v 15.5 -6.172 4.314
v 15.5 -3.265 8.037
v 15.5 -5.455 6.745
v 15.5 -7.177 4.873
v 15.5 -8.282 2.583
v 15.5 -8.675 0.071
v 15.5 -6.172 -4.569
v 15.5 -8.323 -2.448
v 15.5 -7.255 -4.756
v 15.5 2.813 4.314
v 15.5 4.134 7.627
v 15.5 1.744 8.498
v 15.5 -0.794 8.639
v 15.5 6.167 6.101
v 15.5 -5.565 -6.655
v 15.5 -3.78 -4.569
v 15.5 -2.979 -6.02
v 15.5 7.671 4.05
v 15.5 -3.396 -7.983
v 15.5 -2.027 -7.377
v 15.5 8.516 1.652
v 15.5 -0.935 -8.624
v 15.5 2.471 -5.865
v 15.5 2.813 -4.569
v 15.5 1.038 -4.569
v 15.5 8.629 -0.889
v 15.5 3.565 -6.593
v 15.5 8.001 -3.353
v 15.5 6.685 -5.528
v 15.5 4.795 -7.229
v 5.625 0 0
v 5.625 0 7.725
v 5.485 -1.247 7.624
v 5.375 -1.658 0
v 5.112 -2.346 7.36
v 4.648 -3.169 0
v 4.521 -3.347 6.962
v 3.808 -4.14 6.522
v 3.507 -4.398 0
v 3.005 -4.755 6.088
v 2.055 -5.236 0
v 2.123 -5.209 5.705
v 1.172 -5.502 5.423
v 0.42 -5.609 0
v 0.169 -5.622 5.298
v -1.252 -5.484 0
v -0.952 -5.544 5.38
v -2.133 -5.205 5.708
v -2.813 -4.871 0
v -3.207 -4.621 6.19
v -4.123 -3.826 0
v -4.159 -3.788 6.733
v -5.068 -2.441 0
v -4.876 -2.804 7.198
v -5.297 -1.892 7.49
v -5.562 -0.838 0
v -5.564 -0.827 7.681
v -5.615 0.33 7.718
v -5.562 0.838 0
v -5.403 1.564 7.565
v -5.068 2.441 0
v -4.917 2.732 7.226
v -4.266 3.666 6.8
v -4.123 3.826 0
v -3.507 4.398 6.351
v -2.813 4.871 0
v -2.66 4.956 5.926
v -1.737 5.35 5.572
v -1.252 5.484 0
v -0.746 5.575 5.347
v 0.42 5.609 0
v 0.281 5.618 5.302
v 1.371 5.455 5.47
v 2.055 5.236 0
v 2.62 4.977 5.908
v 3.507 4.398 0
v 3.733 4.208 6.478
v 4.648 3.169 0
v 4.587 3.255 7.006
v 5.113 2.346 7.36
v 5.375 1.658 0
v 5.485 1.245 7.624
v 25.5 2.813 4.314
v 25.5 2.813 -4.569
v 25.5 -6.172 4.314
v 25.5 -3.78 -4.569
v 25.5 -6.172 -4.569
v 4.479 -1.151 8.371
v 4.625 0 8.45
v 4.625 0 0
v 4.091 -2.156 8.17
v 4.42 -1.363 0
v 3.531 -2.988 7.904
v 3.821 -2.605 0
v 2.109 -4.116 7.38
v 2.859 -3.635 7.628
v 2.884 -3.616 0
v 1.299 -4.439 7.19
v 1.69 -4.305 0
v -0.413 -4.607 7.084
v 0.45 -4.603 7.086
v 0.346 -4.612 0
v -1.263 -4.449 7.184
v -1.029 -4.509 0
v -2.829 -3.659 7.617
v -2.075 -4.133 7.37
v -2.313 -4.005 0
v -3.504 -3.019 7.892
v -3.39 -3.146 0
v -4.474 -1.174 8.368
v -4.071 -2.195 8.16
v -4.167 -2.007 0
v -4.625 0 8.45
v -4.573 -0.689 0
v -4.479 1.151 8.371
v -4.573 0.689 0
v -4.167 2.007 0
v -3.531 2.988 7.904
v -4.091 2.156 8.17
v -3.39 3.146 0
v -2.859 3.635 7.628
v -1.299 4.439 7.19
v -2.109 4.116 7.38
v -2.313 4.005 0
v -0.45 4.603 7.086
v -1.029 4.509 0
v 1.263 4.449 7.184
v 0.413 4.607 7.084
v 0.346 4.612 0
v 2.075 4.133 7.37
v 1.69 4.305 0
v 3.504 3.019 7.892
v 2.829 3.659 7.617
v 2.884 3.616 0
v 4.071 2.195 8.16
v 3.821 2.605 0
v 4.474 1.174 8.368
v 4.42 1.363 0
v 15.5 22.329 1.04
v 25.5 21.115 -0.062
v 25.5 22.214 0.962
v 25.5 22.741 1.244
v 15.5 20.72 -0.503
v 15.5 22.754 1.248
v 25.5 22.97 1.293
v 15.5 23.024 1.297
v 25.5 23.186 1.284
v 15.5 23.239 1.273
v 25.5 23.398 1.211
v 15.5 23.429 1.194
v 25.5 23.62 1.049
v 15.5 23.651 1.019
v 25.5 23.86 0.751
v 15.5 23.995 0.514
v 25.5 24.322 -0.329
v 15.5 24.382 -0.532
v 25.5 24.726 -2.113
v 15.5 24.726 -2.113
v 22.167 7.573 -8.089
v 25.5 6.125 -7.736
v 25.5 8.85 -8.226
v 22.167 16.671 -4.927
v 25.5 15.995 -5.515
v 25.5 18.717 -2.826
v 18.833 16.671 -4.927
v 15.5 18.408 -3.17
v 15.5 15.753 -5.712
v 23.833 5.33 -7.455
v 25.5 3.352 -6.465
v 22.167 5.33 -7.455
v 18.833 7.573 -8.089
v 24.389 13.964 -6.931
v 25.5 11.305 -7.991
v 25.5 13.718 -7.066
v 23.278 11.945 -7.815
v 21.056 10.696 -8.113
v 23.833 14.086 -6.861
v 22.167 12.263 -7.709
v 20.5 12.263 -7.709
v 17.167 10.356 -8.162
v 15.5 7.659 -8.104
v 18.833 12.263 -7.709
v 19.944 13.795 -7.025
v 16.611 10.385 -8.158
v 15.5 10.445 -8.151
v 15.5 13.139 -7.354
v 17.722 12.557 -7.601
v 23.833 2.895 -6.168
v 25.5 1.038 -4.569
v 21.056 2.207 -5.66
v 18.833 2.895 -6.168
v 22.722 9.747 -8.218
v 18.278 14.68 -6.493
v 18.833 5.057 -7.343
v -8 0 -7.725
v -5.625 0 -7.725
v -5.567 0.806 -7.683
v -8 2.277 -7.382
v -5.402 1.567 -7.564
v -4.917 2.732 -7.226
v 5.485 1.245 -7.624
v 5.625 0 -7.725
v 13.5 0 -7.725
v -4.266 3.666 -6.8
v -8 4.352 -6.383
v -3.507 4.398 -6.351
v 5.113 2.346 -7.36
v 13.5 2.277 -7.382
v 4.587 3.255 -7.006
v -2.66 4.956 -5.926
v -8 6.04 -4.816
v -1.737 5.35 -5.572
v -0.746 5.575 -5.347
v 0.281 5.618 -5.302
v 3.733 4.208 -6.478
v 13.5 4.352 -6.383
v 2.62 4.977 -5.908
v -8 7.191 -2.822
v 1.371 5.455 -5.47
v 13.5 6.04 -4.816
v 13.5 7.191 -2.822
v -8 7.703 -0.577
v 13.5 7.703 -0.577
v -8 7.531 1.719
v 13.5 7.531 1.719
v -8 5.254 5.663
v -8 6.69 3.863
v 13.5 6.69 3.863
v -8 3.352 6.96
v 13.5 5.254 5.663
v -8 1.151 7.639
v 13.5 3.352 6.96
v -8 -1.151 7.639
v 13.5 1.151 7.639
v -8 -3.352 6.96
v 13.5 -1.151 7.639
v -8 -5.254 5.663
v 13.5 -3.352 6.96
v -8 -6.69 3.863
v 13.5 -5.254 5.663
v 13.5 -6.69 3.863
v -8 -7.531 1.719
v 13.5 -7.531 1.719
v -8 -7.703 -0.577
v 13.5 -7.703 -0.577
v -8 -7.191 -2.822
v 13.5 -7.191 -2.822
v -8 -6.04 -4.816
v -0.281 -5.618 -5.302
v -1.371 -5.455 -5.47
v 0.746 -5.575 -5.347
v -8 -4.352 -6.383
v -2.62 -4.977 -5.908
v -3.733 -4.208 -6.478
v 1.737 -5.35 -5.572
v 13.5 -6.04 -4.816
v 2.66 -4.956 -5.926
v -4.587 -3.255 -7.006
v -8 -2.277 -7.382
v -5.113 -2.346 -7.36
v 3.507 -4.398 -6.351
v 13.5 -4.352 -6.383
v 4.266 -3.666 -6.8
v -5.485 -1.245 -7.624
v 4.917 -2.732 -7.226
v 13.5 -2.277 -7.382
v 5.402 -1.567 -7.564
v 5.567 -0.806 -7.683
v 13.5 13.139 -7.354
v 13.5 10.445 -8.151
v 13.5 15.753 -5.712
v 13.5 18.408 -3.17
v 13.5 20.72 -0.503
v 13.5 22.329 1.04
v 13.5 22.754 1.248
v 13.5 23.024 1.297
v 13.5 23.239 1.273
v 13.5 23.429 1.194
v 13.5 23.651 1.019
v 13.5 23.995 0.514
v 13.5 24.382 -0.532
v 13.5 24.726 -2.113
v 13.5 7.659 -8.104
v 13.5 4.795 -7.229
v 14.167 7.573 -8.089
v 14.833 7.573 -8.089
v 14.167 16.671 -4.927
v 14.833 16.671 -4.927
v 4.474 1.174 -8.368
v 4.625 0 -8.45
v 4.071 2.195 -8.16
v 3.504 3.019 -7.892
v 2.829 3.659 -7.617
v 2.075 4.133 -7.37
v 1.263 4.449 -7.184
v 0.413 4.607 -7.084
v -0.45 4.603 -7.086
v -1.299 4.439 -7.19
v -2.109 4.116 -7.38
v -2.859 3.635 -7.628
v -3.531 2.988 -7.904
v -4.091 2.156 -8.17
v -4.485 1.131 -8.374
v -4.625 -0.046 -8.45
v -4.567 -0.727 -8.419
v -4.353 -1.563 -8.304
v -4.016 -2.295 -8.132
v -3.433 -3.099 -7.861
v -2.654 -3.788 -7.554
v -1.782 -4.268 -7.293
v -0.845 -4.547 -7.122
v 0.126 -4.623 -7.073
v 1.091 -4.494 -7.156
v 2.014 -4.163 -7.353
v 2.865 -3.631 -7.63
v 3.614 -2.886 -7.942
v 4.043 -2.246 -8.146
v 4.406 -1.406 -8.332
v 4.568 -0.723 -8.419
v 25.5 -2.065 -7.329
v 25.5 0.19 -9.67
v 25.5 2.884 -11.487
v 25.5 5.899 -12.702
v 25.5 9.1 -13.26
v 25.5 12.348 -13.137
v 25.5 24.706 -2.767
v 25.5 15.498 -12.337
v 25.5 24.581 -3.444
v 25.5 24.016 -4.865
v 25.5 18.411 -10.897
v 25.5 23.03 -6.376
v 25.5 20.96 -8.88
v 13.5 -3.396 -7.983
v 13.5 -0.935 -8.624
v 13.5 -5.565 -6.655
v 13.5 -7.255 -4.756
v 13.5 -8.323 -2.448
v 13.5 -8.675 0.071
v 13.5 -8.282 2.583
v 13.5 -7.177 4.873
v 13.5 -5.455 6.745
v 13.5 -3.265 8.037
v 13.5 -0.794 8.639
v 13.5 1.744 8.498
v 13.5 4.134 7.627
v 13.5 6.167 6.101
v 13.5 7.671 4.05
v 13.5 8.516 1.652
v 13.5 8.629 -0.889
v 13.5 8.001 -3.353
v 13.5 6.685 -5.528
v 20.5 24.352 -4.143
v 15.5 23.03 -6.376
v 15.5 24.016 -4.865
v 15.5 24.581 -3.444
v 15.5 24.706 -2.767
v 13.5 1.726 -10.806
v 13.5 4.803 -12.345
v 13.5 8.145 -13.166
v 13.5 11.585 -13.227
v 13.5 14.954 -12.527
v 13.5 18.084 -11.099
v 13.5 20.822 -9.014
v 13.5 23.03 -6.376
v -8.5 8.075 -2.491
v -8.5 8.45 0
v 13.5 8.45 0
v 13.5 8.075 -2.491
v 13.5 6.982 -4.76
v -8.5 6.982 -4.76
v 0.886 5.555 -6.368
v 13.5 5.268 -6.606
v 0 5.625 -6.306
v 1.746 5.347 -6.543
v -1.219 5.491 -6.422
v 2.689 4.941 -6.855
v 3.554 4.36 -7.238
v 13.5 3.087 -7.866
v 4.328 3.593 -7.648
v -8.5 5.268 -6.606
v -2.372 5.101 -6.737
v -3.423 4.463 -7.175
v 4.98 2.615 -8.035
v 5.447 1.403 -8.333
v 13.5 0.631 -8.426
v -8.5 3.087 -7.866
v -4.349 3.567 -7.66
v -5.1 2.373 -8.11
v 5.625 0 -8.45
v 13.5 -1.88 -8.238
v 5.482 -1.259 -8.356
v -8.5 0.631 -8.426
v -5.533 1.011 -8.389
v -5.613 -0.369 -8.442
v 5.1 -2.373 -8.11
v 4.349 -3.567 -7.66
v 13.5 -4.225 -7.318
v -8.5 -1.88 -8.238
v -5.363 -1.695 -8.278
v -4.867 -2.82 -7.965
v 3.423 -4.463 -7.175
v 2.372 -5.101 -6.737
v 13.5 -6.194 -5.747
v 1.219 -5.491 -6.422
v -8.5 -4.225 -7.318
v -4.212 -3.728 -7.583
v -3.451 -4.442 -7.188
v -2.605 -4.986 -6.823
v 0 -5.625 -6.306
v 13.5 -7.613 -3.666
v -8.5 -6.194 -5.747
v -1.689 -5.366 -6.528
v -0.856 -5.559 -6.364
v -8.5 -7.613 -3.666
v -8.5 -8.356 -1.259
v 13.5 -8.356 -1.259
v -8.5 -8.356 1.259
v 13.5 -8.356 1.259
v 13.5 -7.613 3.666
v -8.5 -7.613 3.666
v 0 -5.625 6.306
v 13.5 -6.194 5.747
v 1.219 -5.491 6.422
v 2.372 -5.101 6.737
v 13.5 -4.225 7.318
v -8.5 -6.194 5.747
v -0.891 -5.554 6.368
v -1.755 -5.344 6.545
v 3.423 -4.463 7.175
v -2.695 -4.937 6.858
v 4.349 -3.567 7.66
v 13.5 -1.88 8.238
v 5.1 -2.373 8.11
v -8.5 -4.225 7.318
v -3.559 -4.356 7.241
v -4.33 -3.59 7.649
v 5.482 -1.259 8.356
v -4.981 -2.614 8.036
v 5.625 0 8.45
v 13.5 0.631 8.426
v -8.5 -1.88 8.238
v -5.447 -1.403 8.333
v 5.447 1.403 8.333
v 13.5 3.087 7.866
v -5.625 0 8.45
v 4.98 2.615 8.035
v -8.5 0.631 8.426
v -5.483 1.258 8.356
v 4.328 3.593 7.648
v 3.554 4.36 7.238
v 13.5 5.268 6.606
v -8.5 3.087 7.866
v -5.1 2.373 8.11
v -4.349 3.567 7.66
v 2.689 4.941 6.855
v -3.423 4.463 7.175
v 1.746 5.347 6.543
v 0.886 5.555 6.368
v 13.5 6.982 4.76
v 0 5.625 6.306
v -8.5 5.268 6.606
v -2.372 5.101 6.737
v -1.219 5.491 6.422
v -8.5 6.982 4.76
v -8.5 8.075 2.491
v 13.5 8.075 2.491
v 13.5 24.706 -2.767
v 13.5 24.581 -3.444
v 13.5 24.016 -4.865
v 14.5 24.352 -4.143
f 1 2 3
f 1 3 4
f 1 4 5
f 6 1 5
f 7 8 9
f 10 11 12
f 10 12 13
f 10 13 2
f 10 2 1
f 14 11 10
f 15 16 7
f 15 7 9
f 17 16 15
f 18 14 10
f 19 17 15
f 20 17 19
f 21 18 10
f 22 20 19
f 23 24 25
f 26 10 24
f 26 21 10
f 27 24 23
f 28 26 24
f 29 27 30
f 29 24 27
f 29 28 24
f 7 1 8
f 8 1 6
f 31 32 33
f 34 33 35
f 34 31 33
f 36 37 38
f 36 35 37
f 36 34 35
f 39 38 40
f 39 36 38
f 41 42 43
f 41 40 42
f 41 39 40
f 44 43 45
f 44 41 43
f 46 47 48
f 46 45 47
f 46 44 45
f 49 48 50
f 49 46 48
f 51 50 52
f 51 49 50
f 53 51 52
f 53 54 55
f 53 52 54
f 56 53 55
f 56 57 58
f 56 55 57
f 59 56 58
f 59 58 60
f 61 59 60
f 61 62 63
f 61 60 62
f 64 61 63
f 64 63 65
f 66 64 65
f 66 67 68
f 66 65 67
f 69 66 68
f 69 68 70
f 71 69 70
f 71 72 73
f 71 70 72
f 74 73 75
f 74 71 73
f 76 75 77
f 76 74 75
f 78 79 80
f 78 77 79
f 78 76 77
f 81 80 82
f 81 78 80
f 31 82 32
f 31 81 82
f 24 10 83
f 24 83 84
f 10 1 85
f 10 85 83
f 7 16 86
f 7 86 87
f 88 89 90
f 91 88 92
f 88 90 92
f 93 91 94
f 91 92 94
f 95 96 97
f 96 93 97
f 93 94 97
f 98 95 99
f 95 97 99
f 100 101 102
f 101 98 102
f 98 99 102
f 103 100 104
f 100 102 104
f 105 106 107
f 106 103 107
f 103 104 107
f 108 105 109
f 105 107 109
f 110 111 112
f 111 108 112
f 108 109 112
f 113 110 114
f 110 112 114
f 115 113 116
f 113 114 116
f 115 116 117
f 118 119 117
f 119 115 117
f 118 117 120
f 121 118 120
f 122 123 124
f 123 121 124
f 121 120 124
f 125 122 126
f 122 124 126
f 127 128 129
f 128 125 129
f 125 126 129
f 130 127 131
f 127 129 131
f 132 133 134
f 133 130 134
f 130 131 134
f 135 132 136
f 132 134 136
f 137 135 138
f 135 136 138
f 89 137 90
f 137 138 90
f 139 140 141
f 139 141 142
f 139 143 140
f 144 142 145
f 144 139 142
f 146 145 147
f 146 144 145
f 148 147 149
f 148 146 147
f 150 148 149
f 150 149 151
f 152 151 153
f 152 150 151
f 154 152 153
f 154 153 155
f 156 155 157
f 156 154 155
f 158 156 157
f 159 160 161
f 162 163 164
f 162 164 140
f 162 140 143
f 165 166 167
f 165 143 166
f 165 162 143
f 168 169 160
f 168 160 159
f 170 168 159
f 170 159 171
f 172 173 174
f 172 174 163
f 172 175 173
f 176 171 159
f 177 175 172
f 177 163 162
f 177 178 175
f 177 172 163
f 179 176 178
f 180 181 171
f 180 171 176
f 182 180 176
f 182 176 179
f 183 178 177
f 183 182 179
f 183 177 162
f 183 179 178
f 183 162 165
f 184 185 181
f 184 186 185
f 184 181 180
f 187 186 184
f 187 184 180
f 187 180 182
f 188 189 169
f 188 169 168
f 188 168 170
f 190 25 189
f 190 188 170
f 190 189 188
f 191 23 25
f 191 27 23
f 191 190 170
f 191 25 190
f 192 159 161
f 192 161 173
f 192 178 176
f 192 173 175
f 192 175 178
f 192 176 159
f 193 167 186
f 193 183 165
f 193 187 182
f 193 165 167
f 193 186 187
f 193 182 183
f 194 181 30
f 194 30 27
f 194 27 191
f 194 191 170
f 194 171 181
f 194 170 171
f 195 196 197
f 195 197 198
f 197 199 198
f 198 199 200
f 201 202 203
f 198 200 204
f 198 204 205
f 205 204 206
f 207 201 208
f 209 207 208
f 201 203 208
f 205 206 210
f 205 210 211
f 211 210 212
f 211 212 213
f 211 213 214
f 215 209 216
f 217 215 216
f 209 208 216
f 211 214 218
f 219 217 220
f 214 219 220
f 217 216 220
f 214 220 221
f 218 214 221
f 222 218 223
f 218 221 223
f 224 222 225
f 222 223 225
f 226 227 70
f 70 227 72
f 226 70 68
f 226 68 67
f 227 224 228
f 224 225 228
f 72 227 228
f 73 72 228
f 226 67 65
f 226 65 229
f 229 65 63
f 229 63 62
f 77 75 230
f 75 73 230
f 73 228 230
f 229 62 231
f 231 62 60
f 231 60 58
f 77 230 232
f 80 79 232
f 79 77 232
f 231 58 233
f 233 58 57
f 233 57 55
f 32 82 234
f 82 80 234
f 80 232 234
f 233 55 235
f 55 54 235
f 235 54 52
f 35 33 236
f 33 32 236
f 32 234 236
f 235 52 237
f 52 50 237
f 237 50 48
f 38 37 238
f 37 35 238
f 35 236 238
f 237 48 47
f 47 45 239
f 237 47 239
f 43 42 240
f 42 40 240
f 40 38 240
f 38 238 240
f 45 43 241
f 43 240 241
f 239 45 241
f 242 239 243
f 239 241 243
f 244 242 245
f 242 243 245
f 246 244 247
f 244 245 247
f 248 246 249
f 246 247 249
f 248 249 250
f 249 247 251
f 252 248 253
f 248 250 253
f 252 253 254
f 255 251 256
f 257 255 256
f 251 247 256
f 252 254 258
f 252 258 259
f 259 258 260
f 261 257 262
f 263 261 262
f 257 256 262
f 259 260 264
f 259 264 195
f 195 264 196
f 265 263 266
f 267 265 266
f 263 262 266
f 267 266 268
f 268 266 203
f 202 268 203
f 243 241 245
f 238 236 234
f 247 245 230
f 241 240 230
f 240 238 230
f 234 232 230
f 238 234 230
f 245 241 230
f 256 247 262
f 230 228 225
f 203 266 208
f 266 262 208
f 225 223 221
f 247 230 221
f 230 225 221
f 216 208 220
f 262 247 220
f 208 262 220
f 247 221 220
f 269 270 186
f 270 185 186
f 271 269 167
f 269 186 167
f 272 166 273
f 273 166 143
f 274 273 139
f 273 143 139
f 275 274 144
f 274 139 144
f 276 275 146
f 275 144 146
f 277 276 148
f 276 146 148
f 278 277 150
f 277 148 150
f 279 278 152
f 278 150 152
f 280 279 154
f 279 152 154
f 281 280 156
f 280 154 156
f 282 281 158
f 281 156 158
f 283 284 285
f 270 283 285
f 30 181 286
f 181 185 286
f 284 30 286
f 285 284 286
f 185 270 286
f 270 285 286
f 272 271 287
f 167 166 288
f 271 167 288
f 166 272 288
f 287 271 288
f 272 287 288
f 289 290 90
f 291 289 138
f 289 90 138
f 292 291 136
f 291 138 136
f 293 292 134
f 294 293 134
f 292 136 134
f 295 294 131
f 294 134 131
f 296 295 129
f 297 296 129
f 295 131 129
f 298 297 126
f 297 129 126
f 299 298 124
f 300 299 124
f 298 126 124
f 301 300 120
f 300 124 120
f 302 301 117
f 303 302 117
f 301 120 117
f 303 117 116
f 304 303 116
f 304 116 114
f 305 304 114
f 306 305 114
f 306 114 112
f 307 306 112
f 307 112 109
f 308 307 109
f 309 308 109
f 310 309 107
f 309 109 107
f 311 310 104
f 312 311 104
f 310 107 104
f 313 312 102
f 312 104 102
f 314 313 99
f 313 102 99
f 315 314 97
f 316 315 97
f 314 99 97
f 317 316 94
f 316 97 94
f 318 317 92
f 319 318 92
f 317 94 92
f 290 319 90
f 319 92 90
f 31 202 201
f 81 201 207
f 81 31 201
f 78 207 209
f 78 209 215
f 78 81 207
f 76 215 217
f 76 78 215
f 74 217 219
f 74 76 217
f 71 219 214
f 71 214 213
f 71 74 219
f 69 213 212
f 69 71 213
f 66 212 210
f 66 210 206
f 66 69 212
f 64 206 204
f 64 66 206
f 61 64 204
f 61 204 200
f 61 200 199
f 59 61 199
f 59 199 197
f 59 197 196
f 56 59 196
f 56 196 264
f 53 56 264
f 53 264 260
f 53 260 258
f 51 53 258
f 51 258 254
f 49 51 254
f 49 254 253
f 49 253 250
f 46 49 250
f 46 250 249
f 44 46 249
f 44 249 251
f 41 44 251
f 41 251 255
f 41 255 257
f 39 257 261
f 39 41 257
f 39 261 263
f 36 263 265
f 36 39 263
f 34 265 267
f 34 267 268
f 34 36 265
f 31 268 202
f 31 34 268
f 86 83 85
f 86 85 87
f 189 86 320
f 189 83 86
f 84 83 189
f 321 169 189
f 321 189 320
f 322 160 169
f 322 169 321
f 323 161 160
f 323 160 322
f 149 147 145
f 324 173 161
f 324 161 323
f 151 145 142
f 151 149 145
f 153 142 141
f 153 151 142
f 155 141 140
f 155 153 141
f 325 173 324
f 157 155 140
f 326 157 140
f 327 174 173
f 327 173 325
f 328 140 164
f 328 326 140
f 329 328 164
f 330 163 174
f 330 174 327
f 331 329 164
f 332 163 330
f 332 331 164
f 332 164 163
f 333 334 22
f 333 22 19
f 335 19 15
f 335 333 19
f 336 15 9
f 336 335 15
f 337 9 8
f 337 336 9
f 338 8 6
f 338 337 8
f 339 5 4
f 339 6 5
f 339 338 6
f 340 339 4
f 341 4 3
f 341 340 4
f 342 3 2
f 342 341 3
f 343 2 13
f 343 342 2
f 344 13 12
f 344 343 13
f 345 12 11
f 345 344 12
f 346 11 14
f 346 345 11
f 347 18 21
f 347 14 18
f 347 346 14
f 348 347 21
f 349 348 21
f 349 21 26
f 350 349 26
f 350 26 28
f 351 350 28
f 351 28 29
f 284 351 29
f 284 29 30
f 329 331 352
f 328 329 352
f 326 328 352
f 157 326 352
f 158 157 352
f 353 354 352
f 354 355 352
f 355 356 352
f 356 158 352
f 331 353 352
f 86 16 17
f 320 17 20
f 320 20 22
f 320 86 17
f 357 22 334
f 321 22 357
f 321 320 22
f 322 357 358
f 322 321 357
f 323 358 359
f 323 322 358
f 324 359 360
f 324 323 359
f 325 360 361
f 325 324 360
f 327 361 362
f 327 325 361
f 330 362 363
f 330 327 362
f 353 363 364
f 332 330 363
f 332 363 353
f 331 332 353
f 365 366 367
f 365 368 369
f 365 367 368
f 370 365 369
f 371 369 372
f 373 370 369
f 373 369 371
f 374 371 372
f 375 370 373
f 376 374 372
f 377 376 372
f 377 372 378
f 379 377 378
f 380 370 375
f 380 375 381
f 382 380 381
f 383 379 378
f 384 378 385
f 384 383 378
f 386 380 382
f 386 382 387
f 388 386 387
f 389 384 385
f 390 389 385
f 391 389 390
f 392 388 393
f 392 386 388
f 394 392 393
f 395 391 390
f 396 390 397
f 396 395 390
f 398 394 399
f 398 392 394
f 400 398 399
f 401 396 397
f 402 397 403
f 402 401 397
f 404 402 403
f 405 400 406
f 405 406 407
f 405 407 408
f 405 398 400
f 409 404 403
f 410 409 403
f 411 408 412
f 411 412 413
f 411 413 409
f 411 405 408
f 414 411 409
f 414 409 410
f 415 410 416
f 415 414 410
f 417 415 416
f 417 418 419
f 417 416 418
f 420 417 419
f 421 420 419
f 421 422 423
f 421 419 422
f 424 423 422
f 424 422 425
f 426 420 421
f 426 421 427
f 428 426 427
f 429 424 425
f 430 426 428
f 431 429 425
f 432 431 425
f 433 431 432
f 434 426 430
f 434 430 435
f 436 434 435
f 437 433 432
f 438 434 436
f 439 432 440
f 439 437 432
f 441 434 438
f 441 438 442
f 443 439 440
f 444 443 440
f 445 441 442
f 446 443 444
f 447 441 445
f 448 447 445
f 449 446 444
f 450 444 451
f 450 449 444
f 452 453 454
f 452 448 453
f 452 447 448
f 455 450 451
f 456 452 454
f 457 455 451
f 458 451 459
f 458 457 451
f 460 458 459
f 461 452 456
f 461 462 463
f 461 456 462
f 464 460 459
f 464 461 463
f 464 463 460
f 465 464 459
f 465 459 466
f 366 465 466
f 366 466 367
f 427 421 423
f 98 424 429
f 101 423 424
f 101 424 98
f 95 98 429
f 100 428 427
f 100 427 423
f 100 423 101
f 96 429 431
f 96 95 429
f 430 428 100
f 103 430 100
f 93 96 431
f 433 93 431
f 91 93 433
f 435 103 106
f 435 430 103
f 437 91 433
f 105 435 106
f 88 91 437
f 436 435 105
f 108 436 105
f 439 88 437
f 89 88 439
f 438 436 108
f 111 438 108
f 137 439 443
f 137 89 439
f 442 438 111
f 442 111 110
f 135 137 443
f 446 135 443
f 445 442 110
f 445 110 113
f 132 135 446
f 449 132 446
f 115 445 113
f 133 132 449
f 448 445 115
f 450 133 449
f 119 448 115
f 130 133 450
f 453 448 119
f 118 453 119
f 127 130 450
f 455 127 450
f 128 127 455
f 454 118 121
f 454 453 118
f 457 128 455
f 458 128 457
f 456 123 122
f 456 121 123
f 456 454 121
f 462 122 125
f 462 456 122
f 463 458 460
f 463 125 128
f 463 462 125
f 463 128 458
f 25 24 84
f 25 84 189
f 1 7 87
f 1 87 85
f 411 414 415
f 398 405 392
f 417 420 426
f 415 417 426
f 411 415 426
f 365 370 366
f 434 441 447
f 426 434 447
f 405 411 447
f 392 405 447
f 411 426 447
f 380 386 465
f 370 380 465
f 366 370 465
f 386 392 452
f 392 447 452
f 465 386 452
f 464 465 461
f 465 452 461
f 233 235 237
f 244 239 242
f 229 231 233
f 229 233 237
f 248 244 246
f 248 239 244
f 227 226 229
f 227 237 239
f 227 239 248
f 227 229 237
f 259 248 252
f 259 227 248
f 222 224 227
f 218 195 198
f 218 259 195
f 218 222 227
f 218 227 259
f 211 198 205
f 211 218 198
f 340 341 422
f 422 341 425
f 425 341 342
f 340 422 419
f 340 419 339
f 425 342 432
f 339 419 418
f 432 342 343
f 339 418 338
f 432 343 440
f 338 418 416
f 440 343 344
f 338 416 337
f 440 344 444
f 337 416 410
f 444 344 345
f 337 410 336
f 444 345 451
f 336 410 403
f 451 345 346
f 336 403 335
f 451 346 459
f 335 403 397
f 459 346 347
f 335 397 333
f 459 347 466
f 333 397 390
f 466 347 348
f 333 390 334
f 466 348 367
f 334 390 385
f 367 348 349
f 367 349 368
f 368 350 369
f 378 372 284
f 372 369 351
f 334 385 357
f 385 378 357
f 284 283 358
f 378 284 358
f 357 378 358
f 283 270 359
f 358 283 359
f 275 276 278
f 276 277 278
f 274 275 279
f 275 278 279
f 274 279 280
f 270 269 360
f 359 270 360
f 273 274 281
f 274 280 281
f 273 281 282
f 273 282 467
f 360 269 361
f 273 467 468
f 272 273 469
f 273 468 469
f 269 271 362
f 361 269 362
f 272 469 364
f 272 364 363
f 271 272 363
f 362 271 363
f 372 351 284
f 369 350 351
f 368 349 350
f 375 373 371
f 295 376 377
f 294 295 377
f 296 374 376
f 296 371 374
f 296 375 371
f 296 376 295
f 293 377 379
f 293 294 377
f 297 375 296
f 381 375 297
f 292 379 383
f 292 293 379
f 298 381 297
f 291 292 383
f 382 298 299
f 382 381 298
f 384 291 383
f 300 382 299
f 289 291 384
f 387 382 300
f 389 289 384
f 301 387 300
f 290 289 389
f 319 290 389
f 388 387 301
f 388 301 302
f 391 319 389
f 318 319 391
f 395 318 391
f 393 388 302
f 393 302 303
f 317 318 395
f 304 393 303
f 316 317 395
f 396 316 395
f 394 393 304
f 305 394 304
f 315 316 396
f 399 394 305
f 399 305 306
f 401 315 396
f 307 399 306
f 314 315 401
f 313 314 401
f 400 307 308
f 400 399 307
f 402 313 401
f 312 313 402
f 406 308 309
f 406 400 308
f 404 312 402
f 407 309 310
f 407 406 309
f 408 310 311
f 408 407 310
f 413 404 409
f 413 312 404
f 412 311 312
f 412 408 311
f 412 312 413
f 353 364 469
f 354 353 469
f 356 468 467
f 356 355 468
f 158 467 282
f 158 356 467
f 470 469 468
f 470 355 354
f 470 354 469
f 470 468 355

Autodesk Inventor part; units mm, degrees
ref_plane "YZ Plane" through (0, 0, 0) normal (1, 0, 0) x (0, 1, 0)
ref_plane "XZ Plane" through (0, 0, 0) normal (0, 1, 0) x (-1, 0, 0)
ref_plane "XY Plane" through (0, 0, 0) normal (0, 0, 1) x (1, 0, 0)
sketch "Sketch1" plane through (0, 0, 0) normal (1, 0, 0) x (0, 1, 0)
  circle A0 centre (0, 0) radius 8.45
  dimension "d0" = 16.9
extrude "Extrusion1" add sketch "Sketch1" along normal blind 13.5 and the other way blind 8.5
sketch "Sketch2" plane through (13.5, 0, 0) normal (1, 0, 0) x (0, 0, -1)
  circle A0 centre (0, 0) radius 7.725
  circle A1 centre (0, 0) radius 9.725
  dimension "d3" = 2
  dimension "d4" = 19.45
extrude "Extrusion2" cut sketch "Sketch2" against normal blind 21.5 contours A0
sketch "Sketch3" plane through (0, 0, 0) normal (0, 0, 1) x (1, 0, 0)
  circle A0 centre (0, 0) radius 5.625
  dimension "d7" = 11.25
extrude "Extrusion3" add sketch "Sketch3" along normal mid plane 18
sketch "Sketch4" plane through (0, 0, 0) normal (0, 0, 1) x (1, 0, 0)
  circle A0 centre (0, 0) radius 4.625
  dimension "d10" = 9.25
extrude "Extrusion5" cut sketch "Sketch4" along normal mid plane 100
sketch "Sketch5" plane through (13.5, 0, 0) normal (1, 0, 0) x (0, 0, -1)
  circle A0 centre (0, 0) radius 8.675
  dimension "d15" = 17.35
extrude "Extrusion6" add sketch "Sketch5" along normal blind 2
sketch "Sketch6" plane through (15.5, 0, 0) normal (1, 0, 0) x (0, 0, -1)
  arc A0 (1.0628, -4.9847) -> (6.3756, 23.0304) centre (-2.1717, 10.14) ccw
  spline S0 degree 4 poles (1.0628, -0.783) (3.325, -0.3237) (6.6509, 1.9196) (12.5543, 12.8577) (0.0955, 21.0445) (-3.8878, 23.6903) (2.1134, 24.7257) knots 0 0 0 0 0 0.38125 0.63125 1 1 1 1 1
  line L0 (-1.8785, -1.3802) -> (4.0041, -0.1858) construction
  arc A1 (-1.2523, -0.8951) -> (3.2382, 0.0167) centre (-0.4606, 6.7196) ccw construction
  spline S1 degree 2 poles (6.3756, 23.0304) (3.3857, 25.3291) (1.0628, 24.5204) knots 0 0 0 1 1 1
  line L1 (-6.8176, 23.1848) -> (11.0445, 26.2665) construction
  arc A2 (9.1477, 24.9445) -> (-4.5875, 22.5748) centre (6.4085, -0.169) ccw construction
  line L2 (-4.3138, 2.8134) -> (4.5692, 2.8134)
  line L3 (4.5692, -6.1723) -> (-4.3138, -6.1723)
  line L4 (-4.3138, -6.1723) -> (-4.3138, 2.8134)
  line L5 (4.5692, 2.8134) -> (4.5692, 1.038)
  line L6 (4.5692, -3.7804) -> (4.5692, -6.1723)
  point P0 (0, 0)
  point P1 (-0.6365, 21.8121)
  point P2 (1.0628, -0.783)
  point P3 (3.2364, 24.6304)
  point P4 (2.1134, 24.7257)
  point P5 (2.1133, 24.7254)
  point P6 (1.0633, 24.5166)
  dimension "d10" = 9.25
extrude "Extrusion7" add sketch "Sketch6" along normal blind 10 and the other way blind 2
sketch "Sketch7" plane through (-8.5, 0, 0) normal (-1, 0, 0) x (0, 0, 1)
  circle A0 centre (0, 0) radius 8.45
  circle A1 centre (0, 0) radius 11.1999
  dimension "d23" = 16.9
extrude "Extrusion8" cut sketch "Sketch7" against normal blind 17.75
properties part number "valve insert-mod"
